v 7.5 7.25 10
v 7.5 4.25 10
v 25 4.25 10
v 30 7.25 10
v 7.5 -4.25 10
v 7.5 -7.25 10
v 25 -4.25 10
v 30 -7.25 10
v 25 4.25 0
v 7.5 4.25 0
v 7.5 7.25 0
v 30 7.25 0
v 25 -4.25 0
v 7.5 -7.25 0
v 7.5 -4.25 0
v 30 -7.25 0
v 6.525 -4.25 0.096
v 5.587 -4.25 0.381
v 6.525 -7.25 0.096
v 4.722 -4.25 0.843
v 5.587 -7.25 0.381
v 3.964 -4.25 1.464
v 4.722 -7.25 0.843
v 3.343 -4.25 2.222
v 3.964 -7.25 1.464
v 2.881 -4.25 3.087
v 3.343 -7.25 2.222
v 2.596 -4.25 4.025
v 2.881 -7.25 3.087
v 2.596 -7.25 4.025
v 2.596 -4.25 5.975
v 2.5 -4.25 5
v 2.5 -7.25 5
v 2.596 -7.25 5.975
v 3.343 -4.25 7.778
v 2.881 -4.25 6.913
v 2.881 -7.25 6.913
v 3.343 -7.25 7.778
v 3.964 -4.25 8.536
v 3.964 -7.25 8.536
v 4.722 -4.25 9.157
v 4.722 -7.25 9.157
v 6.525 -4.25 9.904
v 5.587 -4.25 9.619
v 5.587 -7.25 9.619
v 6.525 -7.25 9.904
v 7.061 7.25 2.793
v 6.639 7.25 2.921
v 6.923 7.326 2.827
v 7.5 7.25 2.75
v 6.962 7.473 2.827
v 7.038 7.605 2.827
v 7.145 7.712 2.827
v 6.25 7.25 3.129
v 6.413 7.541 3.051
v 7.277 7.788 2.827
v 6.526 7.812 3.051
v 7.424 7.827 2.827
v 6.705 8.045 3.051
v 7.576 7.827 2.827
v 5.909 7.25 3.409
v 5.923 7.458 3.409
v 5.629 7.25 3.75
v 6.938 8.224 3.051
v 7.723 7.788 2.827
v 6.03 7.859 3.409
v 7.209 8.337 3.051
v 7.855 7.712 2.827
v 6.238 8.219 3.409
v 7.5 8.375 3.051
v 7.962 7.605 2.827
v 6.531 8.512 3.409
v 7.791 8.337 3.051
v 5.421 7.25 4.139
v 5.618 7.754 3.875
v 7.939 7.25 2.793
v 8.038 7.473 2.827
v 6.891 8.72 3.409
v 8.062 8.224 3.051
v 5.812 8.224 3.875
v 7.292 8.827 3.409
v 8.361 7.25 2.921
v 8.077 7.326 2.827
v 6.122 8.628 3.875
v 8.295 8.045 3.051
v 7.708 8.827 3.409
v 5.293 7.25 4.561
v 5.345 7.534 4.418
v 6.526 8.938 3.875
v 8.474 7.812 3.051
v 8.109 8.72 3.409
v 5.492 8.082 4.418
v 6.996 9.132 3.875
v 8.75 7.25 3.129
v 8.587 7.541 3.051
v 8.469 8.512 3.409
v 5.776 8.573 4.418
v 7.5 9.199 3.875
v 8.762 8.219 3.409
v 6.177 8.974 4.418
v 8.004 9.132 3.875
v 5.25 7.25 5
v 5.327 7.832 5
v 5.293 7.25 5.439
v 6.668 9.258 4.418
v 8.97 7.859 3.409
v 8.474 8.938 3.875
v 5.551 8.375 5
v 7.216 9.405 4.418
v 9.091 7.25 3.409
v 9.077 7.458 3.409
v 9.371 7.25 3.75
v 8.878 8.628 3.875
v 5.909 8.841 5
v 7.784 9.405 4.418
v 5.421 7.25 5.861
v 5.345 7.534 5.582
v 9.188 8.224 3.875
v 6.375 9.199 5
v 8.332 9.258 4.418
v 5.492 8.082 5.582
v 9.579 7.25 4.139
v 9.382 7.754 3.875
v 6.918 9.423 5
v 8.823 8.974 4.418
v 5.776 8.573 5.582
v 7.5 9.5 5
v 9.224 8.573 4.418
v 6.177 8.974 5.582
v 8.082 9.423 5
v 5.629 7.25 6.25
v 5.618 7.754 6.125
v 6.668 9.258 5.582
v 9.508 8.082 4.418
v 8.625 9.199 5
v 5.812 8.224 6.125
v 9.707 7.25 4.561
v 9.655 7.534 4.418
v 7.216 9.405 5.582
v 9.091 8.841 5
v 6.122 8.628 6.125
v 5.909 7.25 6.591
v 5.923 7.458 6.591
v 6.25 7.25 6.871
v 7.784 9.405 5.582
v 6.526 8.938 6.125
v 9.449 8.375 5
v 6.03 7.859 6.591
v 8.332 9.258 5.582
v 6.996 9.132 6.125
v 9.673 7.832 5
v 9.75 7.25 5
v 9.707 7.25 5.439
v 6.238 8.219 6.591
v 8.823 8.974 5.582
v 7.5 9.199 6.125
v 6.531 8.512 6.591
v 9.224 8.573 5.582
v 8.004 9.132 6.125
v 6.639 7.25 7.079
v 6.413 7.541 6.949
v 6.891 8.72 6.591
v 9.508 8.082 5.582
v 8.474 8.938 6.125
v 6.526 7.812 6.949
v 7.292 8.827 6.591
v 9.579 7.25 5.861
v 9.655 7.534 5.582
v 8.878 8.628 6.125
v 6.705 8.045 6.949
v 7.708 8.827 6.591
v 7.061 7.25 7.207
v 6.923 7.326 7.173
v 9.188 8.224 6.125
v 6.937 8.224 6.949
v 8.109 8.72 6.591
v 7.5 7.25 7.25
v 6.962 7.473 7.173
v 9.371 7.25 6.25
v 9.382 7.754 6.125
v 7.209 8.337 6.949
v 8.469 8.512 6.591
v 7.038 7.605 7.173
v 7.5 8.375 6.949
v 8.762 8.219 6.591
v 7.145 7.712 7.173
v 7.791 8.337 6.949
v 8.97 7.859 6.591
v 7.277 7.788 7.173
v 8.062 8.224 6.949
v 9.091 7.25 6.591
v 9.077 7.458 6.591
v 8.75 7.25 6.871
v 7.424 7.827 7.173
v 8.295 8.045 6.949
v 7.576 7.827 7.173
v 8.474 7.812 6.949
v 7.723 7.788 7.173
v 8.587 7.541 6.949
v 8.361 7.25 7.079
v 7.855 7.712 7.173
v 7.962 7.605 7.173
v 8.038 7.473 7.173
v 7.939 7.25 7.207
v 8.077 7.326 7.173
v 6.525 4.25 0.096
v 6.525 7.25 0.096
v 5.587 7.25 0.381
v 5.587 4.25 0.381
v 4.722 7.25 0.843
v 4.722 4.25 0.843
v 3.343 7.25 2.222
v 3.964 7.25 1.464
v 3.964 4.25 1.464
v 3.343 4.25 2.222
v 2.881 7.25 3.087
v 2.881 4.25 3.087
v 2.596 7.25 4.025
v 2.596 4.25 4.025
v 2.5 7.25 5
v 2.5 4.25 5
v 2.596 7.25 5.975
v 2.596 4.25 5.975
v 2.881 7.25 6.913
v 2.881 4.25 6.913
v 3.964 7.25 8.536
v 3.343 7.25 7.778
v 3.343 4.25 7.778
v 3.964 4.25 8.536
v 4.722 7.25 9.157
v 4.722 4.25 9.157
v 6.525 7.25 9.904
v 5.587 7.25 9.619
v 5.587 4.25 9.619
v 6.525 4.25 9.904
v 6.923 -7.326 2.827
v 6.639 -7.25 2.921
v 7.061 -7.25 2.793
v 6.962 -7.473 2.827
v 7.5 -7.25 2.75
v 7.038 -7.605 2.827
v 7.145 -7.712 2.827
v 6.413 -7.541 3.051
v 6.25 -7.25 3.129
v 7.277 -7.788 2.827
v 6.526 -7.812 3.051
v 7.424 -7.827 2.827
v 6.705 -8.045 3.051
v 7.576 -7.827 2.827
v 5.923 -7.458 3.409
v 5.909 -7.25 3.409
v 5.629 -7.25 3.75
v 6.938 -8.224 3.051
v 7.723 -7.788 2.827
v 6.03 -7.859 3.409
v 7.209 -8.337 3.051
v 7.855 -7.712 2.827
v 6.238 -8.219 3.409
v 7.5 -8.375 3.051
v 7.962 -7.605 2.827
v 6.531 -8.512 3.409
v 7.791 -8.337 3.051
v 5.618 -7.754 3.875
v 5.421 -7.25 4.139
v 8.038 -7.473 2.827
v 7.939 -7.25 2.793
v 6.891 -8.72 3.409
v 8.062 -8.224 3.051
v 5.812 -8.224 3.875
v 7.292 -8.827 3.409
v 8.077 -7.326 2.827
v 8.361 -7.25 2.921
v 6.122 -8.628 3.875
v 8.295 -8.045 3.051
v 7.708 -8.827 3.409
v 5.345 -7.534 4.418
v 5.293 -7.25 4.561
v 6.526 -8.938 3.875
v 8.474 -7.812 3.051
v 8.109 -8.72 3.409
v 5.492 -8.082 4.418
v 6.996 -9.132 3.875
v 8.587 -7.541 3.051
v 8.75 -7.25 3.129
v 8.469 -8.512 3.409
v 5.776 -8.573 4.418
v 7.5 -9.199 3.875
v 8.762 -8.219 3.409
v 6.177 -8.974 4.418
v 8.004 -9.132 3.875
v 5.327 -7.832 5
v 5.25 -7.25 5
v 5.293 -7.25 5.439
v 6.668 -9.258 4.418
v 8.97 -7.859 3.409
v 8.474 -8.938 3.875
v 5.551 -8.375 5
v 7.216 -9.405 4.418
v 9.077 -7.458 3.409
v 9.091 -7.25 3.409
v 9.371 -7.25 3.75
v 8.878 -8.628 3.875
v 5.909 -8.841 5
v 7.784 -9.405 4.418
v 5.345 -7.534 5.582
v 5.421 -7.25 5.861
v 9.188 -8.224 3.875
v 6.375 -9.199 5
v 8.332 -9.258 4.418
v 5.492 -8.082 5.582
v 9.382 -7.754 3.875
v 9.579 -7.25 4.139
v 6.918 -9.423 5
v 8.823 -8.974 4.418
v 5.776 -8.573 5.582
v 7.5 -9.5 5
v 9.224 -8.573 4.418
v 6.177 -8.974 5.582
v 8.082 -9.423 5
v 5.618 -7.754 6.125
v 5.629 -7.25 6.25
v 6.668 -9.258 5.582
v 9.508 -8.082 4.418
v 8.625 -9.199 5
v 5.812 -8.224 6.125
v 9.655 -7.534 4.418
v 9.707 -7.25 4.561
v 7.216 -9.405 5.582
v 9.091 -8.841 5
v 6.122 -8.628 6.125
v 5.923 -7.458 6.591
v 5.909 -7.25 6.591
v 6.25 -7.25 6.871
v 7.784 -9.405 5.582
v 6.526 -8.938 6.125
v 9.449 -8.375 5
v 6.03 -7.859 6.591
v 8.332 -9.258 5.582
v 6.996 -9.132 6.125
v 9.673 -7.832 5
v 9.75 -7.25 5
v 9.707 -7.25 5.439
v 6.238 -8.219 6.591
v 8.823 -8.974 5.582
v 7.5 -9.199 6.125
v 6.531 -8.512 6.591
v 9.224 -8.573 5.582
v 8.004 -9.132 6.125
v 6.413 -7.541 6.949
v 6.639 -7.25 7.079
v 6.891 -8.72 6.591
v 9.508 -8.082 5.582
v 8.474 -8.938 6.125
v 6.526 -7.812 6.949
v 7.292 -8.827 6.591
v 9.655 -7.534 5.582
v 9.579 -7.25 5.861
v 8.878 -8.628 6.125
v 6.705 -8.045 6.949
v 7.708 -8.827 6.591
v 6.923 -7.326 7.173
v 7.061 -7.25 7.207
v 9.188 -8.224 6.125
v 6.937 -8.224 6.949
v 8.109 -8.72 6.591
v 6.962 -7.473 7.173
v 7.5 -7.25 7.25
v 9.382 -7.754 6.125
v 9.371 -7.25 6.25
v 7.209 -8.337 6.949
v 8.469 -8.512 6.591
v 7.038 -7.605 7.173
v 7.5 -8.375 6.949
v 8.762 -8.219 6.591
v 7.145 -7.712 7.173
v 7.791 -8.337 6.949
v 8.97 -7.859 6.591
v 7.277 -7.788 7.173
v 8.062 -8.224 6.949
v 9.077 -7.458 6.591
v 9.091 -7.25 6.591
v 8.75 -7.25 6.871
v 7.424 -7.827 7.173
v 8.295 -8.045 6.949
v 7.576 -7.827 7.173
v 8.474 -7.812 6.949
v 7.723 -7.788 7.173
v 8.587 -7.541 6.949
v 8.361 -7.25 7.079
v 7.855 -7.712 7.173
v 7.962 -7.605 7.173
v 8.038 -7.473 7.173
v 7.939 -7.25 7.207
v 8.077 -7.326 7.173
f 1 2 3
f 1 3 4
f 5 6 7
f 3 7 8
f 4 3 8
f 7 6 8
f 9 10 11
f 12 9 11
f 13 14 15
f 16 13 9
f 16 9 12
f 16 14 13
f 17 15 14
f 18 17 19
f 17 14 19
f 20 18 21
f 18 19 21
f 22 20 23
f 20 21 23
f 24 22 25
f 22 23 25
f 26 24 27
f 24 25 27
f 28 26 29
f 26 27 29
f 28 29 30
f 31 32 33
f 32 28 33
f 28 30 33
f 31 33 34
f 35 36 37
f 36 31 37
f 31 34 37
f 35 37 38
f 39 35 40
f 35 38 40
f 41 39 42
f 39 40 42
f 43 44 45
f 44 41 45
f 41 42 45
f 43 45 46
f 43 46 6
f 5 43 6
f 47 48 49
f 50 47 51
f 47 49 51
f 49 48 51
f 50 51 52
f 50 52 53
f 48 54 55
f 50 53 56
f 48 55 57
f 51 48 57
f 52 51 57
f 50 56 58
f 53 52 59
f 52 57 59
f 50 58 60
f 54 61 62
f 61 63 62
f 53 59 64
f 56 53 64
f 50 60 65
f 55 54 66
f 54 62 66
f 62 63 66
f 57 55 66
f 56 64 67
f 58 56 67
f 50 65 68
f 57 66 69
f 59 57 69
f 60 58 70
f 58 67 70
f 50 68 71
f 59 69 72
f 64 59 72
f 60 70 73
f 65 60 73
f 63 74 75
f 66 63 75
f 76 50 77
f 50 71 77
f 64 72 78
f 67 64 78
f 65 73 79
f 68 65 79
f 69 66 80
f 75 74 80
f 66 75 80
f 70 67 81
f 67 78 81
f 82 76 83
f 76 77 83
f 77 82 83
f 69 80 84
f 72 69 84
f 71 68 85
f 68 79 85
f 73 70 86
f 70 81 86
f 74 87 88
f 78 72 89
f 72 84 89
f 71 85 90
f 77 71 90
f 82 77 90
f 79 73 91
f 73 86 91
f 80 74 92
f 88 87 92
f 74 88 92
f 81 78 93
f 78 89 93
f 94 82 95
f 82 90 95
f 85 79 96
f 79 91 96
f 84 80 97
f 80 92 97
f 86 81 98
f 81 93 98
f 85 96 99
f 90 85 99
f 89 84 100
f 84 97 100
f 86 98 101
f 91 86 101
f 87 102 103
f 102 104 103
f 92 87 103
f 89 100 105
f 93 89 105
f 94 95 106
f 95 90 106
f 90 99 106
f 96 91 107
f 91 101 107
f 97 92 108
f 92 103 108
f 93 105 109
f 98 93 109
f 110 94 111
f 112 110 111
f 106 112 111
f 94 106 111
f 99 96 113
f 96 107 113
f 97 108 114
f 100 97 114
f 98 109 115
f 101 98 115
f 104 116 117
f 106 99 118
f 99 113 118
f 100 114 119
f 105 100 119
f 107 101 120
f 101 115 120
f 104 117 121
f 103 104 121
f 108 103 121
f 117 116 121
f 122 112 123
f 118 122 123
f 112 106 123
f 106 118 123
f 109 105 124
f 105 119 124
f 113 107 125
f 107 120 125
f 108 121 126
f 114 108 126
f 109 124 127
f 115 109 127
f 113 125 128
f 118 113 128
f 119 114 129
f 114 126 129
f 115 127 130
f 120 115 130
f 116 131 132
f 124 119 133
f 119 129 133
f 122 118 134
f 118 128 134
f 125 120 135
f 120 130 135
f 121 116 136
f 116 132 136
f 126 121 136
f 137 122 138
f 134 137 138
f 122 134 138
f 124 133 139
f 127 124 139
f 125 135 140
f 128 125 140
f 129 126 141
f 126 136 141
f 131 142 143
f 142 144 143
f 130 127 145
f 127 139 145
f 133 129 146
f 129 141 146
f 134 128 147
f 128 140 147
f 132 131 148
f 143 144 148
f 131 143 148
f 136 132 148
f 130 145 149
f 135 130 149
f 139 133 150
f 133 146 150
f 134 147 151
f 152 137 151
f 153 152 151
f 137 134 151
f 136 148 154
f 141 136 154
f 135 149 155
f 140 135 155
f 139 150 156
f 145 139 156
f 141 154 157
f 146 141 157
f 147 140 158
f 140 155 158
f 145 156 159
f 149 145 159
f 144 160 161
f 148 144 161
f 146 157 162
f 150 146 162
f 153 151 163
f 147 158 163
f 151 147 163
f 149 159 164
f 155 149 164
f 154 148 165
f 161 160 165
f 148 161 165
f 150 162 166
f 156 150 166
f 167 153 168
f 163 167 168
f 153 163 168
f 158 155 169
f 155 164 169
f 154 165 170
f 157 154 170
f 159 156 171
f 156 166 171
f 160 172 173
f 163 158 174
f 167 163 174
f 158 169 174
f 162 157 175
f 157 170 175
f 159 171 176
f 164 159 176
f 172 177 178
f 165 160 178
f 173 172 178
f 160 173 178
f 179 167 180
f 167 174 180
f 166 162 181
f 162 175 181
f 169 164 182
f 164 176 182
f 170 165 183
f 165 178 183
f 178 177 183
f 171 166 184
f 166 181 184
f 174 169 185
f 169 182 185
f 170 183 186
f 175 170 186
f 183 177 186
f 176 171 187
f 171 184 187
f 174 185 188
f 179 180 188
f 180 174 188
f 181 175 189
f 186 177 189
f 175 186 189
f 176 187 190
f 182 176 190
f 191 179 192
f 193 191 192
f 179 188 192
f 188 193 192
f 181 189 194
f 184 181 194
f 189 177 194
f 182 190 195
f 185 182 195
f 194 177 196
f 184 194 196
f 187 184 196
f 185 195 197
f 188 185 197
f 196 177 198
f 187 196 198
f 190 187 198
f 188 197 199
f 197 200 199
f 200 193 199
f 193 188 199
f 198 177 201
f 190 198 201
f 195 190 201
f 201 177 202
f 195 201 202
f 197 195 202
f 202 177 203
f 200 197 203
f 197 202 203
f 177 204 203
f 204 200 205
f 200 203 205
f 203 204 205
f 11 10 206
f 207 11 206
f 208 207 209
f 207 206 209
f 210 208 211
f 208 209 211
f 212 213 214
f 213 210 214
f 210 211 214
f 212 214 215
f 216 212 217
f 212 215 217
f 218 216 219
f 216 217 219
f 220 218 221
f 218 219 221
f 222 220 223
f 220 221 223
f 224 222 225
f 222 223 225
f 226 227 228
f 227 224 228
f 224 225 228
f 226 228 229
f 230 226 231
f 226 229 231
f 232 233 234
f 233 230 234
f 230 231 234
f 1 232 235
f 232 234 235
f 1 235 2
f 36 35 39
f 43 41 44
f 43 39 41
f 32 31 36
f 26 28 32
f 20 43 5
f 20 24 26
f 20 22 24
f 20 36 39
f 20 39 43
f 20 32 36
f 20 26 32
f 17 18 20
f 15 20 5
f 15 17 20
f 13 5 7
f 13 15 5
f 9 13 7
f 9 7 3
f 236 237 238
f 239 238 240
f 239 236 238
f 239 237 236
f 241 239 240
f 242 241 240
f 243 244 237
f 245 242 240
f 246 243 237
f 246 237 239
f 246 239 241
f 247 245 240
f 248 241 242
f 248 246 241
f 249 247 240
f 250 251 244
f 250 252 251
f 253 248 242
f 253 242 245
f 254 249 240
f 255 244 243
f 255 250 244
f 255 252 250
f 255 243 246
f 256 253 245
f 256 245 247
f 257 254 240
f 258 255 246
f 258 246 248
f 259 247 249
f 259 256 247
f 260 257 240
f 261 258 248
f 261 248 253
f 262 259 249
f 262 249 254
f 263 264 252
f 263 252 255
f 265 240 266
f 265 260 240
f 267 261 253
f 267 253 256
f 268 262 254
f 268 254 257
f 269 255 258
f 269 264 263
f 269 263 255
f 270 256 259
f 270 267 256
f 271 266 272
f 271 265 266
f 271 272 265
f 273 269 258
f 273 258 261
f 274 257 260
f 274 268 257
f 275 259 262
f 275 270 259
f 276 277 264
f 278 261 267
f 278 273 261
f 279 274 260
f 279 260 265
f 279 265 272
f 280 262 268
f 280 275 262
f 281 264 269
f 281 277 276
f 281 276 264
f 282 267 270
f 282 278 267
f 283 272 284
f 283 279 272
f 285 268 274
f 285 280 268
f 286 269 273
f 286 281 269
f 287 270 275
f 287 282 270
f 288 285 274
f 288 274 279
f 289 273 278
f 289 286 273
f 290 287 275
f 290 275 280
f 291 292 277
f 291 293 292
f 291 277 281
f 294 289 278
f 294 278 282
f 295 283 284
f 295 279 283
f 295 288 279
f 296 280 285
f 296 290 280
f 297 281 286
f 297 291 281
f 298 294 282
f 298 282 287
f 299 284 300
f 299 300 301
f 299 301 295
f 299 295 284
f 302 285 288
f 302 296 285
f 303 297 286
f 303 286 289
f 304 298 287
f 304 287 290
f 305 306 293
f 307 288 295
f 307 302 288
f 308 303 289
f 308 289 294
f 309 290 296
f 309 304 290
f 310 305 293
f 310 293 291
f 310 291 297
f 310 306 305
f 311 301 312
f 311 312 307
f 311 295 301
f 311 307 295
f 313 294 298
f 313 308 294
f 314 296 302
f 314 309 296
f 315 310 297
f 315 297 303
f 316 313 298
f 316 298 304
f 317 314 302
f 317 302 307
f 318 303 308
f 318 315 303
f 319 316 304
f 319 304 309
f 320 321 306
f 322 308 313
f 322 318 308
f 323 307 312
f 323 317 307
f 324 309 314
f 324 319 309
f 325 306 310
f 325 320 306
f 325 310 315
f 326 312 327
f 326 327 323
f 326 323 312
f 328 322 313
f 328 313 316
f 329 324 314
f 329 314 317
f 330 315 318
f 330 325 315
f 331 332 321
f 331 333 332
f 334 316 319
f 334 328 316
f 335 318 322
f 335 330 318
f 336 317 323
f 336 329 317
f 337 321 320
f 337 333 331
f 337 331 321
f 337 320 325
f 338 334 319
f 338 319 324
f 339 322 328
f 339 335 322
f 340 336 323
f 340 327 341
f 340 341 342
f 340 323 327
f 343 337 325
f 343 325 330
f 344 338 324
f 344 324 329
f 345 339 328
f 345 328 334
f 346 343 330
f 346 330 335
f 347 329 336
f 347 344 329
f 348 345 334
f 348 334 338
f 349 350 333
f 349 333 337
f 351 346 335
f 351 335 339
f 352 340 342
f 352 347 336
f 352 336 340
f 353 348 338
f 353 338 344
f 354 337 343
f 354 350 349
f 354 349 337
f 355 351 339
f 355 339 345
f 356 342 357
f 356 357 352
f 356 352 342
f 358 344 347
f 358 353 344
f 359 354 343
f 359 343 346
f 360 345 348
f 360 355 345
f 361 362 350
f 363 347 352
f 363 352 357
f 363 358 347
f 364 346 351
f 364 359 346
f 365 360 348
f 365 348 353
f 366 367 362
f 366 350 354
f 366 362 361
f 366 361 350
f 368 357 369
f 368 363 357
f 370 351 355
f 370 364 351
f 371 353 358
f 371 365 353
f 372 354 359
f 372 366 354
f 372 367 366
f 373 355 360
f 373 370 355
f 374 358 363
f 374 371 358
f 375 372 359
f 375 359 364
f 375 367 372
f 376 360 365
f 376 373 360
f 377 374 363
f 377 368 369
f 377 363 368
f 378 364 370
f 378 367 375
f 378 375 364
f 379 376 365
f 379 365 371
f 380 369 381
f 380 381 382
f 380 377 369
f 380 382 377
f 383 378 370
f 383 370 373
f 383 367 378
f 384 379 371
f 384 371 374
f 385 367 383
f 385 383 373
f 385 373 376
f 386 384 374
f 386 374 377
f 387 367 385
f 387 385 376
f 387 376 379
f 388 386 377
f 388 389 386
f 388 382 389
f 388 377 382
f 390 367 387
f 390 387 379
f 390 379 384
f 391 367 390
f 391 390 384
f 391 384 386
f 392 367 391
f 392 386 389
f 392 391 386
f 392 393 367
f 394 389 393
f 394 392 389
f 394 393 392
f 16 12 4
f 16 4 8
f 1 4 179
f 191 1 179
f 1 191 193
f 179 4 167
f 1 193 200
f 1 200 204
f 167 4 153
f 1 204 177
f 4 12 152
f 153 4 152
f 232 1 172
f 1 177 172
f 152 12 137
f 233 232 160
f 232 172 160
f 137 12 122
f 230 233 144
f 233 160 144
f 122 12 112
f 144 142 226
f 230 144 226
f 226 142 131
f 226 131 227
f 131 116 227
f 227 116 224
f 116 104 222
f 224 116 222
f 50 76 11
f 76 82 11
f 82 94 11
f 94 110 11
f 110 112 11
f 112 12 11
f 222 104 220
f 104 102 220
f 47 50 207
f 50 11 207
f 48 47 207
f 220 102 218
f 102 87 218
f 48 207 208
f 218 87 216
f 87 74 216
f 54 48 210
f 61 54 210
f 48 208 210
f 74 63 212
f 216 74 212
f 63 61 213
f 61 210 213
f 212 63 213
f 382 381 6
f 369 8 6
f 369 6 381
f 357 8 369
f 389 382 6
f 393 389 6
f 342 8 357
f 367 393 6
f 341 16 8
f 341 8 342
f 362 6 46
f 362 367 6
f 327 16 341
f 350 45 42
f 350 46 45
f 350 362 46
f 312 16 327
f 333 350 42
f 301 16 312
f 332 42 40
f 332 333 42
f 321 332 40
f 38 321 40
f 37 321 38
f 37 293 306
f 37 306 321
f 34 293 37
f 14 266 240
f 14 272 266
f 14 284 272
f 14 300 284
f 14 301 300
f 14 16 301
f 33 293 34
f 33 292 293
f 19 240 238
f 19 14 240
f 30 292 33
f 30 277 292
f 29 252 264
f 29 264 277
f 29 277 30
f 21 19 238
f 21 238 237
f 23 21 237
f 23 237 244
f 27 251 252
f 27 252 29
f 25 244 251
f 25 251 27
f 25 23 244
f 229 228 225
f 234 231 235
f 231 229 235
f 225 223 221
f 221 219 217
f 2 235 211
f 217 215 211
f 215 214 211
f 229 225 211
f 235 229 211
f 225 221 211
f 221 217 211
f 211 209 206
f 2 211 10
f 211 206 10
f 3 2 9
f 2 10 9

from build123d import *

# Parameters (mm, degrees)
F1_DEPTH = 10
F6_DEPTH = 25


with BuildPart() as f1:
    # F0 (on Top) → F1 (new body)
    with BuildSketch(Plane.XY):
        Polygon((25, 4.25), (25, 0), (30, 0), (30, 7.25), (0, 7.25), (0, 4.25), align=None)
    extrude(amount=F1_DEPTH)

    # F2 (on face) → F3 (revolve)
    with BuildSketch(Plane(origin=(0, 7.25, 0), x_dir=(-1, 0, 0), z_dir=(0, 1, 0))):
        with BuildLine():
            Line((-7.5, 7.25), (-7.5, 2.75))
            ThreePointArc((-7.5, 2.75), (-5.25, 5), (-7.5, 7.25))
        make_face()
    revolve(axis=Axis((7.5, 7.25, 5), (0, 0, -1)))

    # F4: F1 across plane


with BuildPart() as f1_1:
    add(f1.part)
    add(f1.part.mirror(Plane.XZ))

    # F5 (on face) → F6 (cut)
    with BuildSketch(Plane.XZ.offset(7.25)):
        with BuildLine():
            ThreePointArc((7.5, 0), (2.5, 5), (7.5, 10))
            Line((7.5, 10), (0, 10))
            Line((0, 10), (0, 0))
            Line((0, 0), (7.5, 0))
        make_face()
    extrude(amount=-F6_DEPTH, mode=Mode.SUBTRACT)


solid = f1_1.part
